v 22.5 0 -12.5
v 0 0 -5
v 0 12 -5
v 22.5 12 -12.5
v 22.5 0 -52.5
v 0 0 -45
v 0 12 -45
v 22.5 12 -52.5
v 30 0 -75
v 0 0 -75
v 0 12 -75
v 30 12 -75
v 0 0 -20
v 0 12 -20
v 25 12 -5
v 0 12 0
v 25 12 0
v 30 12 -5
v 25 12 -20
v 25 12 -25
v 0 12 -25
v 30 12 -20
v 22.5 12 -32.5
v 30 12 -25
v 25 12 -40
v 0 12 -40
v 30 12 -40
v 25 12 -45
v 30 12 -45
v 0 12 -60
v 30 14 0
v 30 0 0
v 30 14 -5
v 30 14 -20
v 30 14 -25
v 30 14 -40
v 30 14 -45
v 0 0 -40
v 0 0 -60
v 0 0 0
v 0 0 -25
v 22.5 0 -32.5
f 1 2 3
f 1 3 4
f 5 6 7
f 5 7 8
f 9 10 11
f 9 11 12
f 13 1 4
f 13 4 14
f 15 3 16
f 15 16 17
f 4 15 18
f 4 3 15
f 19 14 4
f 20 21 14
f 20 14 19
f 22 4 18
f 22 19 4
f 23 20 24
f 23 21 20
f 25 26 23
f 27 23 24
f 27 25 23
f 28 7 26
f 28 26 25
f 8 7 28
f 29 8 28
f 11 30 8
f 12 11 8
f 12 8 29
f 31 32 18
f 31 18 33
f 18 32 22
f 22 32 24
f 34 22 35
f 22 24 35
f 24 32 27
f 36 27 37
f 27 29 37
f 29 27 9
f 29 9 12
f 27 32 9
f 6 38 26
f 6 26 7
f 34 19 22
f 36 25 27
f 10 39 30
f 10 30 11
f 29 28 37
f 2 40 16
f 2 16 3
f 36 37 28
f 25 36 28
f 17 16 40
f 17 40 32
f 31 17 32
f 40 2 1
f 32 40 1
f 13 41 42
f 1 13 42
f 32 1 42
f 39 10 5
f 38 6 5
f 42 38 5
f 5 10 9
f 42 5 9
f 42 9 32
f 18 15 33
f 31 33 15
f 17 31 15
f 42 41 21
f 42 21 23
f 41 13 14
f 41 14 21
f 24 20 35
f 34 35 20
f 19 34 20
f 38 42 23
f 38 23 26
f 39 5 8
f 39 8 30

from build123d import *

# Parameters (mm, degrees)
SKETCH1_W           = 30
SKETCH1_H           = 75
BOSS_EXTRUDE1_DEPTH = 12
CUT_EXTRUDE1_DEPTH  = 12
LPATTERN1_COUNT     = 3
LPATTERN1_PITCH     = 20
BOUNDARY1_START     = -45
BOUNDARY1_DEPTH     = 5
LPATTERN2_COUNT     = 3
LPATTERN2_PITCH     = 20


# Read off the part's stored shape, not the designer's step: Boundary1
with BuildPart() as part:
    # Sketch1 → Boss-Extrude1 (new body)
    with BuildSketch(Plane(origin=(0, 0, 0), x_dir=(1, 0, 0), z_dir=(0, 1, 0))):
        with Locations((15, 37.5)):
            Rectangle(SKETCH1_W, SKETCH1_H)
    extrude(amount=BOSS_EXTRUDE1_DEPTH)

    # Sketch3 → Cut-Extrude1 (cut)
    with BuildSketch(Plane(origin=(0, 0, 0), x_dir=(1, 0, 0), z_dir=(0, 1, 0))):
        Polygon((0, 5), (22.5, 12.5), (0, 20), align=None)
    cut_extrude1 = extrude(amount=CUT_EXTRUDE1_DEPTH, mode=Mode.SUBTRACT)

    # LPattern1: Cut-Extrude1 ×3
    with Locations(*[(0, 0, -i * LPATTERN1_PITCH) for i in range(1, LPATTERN1_COUNT)]):
        add(cut_extrude1, mode=Mode.SUBTRACT)

    # Boundary1 outline → Boundary1 (add)
    with BuildSketch(Plane.XY.offset(BOUNDARY1_START)):
        Polygon((30, 14), (25, 12), (30, 12), align=None)
    boundary1 = extrude(amount=BOUNDARY1_DEPTH)

    # LPattern2: Boundary1 ×3
    with Locations(*[(0, 0, i * LPATTERN2_PITCH) for i in range(1, LPATTERN2_COUNT)]):
        add(boundary1)


solid = part.part
